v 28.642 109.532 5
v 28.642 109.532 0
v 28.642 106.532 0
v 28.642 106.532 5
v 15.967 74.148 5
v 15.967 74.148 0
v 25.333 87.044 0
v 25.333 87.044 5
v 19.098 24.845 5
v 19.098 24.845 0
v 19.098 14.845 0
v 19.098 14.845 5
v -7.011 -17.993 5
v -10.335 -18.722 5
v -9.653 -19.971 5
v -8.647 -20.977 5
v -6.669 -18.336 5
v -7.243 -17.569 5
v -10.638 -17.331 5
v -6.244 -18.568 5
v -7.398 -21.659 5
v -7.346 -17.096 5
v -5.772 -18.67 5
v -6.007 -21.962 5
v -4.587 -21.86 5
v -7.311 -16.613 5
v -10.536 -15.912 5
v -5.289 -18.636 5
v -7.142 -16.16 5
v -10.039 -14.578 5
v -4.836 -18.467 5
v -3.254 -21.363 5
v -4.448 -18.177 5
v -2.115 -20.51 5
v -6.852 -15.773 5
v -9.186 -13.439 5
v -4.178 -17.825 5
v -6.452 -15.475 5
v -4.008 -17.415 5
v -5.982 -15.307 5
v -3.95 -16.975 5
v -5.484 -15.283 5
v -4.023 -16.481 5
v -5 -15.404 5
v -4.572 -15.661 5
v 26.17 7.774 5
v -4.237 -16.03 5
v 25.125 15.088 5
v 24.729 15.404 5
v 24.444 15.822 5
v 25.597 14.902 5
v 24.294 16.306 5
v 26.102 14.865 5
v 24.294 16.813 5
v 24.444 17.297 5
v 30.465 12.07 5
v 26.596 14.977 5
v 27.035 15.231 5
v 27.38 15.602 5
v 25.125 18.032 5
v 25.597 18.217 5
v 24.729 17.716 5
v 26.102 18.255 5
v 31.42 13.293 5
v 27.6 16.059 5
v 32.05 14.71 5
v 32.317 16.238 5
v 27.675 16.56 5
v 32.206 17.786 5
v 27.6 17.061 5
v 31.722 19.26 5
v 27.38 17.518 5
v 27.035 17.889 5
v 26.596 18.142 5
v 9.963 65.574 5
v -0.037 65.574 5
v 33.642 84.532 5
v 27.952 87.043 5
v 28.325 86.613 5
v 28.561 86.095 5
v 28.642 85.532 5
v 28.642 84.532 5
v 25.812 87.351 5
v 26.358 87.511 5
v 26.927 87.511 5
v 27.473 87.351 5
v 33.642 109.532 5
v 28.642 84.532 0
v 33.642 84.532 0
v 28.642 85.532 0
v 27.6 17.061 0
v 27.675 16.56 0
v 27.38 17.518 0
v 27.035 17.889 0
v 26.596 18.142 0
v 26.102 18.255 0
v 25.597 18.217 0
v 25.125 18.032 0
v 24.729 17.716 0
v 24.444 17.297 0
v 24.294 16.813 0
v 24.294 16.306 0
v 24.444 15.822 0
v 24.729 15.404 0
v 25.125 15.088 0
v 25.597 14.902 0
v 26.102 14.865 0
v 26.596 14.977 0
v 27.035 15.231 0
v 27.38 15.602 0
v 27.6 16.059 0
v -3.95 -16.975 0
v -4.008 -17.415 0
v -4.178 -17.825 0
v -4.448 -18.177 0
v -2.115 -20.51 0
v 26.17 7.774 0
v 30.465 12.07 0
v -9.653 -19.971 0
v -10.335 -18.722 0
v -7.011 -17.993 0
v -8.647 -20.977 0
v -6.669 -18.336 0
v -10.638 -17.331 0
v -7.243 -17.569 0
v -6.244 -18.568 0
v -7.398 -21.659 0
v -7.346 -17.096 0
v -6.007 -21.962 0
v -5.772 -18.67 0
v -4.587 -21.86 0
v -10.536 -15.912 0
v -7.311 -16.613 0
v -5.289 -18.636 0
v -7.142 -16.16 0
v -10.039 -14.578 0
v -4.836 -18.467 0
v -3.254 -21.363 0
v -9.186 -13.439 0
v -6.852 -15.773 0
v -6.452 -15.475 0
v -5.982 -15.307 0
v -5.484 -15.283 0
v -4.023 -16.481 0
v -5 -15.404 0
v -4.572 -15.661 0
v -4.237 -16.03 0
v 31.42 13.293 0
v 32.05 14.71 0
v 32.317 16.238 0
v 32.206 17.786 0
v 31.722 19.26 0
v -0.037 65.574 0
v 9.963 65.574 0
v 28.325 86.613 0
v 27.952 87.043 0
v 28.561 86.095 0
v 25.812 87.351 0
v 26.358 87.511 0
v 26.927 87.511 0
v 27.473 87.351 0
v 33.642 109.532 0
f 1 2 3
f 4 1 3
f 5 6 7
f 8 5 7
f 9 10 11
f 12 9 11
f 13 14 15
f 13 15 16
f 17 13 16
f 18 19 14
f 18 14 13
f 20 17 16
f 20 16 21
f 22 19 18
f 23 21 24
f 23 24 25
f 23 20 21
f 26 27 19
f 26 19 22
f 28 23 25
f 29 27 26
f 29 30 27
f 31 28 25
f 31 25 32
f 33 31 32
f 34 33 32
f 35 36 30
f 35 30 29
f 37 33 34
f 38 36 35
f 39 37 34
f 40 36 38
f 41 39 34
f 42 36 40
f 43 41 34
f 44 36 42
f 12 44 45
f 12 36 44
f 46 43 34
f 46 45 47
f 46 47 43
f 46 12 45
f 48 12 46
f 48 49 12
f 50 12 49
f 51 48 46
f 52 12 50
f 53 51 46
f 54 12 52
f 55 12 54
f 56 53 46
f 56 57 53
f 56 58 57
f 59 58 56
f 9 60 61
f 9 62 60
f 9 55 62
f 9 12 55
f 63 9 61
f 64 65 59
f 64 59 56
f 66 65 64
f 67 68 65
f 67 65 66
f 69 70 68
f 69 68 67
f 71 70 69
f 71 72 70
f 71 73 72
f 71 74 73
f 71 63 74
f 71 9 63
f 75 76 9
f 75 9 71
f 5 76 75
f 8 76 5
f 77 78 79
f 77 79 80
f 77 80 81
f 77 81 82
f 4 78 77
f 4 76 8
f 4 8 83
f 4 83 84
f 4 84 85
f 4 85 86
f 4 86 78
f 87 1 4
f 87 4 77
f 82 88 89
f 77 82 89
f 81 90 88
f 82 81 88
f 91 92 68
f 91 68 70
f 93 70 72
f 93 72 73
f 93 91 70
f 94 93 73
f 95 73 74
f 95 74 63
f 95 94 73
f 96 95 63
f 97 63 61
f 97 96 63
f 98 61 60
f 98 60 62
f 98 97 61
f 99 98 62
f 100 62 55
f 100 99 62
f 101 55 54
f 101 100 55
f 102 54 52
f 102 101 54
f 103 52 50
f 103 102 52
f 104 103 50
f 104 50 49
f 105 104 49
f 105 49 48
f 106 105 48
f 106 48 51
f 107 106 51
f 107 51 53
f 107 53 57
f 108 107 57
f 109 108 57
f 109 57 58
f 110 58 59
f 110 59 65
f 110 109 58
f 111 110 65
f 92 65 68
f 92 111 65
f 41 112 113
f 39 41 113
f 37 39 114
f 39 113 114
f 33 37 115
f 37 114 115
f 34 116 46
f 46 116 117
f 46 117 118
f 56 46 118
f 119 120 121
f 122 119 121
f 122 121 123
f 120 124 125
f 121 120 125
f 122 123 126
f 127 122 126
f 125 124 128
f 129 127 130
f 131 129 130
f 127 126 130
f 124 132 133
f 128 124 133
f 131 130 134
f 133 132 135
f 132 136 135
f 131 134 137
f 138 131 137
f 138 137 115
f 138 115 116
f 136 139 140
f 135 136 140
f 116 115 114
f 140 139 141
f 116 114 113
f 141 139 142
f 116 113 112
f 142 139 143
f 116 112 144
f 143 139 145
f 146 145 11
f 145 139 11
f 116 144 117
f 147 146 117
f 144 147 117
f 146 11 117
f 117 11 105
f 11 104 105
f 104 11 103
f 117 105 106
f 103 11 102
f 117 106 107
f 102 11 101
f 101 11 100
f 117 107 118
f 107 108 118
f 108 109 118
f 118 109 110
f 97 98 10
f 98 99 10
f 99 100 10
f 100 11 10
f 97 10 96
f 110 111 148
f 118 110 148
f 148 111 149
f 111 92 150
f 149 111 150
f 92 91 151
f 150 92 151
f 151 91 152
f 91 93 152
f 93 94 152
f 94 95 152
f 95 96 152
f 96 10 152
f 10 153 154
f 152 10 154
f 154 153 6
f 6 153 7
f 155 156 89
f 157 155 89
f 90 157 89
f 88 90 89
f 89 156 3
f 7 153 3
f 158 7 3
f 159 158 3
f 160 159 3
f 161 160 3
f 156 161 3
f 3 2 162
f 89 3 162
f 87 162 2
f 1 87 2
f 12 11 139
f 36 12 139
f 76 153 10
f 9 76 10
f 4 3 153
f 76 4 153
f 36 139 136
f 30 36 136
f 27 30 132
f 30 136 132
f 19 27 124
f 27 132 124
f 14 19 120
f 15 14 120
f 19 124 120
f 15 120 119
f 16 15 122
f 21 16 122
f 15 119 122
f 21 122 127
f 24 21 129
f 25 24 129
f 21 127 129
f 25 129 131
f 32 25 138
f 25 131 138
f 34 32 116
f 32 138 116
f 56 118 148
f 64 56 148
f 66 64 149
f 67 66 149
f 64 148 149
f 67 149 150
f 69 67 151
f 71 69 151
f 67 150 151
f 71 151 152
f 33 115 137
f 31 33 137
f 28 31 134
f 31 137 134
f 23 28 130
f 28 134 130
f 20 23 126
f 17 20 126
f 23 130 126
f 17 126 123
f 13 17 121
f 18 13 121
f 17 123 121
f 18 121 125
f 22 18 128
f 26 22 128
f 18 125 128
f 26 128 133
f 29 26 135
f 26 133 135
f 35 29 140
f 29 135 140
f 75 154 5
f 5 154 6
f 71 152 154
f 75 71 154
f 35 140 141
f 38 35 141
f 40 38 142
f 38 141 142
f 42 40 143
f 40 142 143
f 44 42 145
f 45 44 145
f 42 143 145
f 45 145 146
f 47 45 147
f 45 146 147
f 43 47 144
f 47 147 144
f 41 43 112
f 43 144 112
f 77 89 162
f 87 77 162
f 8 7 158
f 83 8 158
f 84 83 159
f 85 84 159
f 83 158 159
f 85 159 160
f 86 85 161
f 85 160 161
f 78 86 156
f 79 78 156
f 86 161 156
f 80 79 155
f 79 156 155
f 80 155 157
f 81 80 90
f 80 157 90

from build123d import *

# Parameters (mm, degrees)
F0_R     = 1.7
F1_DEPTH = 5


with BuildPart() as f1:
    # F0 (on Top) → F1 (new body)
    with BuildSketch(Plane.XY):
        with BuildLine():
            Line((33.642043, 109.531558), (28.642043, 109.531558))
            Line((28.642043, 109.531558), (28.642043, 106.531558))
            Line((28.642043, 106.531558), (-0.036779, 65.573956))
            Line((-0.036779, 65.573956), (19.098496, 24.845081))
            Line((19.098496, 24.845081), (19.098496, 14.845081))
            Line((19.098496, 14.845081), (26.169564, 7.774013))
            Line((26.169564, 7.774013), (30.465285, 12.069734))
            ThreePointArc((30.465285, 12.069734), (32.230269, 15.466208), (31.722454, 19.260062))
            Line((31.722454, 19.260062), (9.963221, 65.573956))
            Line((9.963221, 65.573956), (15.967054, 74.148317))
            Line((15.967054, 74.148317), (25.332929, 87.043583))
            ThreePointArc((25.332929, 87.043583), (27.473238, 87.350655), (28.642043, 85.531558))
            Line((28.642043, 85.531558), (28.642043, 84.531558))
            Line((28.642043, 84.531558), (33.642043, 84.531558))
            Line((33.642043, 84.531558), (33.642043, 109.531558))
        make_face()
        with Locations((25.975157, 16.559862)):
            Circle(F0_R, mode=Mode.SUBTRACT)
        with BuildLine():
            Line((26.169564, 7.774013), (19.098496, 14.845081))
            Line((19.098496, 14.845081), (-9.185775, -13.439191))
            Line((-9.185775, -13.439191), (-6.852323, -15.772643))
            ThreePointArc((-6.852323, -15.772643), (-4.99968, -15.404129), (-3.950241, -16.974725))
            ThreePointArc((-3.950241, -16.974725), (-4.079646, -17.625286), (-4.44816, -18.176806))
            Line((-4.44816, -18.176806), (-2.114708, -20.510258))
            Line((-2.114708, -20.510258), (26.169564, 7.774013))
        make_face()
        with BuildLine():
            Line((-6.852323, -15.772643), (-9.185775, -13.439191))
            ThreePointArc((-9.185775, -13.439191), (-9.185775, -20.510258), (-2.114708, -20.510258))
            Line((-2.114708, -20.510258), (-4.44816, -18.176806))
            ThreePointArc((-4.44816, -18.176806), (-6.852323, -18.176806), (-6.852323, -15.772643))
        make_face()
    extrude(amount=F1_DEPTH)


solid = f1.part
